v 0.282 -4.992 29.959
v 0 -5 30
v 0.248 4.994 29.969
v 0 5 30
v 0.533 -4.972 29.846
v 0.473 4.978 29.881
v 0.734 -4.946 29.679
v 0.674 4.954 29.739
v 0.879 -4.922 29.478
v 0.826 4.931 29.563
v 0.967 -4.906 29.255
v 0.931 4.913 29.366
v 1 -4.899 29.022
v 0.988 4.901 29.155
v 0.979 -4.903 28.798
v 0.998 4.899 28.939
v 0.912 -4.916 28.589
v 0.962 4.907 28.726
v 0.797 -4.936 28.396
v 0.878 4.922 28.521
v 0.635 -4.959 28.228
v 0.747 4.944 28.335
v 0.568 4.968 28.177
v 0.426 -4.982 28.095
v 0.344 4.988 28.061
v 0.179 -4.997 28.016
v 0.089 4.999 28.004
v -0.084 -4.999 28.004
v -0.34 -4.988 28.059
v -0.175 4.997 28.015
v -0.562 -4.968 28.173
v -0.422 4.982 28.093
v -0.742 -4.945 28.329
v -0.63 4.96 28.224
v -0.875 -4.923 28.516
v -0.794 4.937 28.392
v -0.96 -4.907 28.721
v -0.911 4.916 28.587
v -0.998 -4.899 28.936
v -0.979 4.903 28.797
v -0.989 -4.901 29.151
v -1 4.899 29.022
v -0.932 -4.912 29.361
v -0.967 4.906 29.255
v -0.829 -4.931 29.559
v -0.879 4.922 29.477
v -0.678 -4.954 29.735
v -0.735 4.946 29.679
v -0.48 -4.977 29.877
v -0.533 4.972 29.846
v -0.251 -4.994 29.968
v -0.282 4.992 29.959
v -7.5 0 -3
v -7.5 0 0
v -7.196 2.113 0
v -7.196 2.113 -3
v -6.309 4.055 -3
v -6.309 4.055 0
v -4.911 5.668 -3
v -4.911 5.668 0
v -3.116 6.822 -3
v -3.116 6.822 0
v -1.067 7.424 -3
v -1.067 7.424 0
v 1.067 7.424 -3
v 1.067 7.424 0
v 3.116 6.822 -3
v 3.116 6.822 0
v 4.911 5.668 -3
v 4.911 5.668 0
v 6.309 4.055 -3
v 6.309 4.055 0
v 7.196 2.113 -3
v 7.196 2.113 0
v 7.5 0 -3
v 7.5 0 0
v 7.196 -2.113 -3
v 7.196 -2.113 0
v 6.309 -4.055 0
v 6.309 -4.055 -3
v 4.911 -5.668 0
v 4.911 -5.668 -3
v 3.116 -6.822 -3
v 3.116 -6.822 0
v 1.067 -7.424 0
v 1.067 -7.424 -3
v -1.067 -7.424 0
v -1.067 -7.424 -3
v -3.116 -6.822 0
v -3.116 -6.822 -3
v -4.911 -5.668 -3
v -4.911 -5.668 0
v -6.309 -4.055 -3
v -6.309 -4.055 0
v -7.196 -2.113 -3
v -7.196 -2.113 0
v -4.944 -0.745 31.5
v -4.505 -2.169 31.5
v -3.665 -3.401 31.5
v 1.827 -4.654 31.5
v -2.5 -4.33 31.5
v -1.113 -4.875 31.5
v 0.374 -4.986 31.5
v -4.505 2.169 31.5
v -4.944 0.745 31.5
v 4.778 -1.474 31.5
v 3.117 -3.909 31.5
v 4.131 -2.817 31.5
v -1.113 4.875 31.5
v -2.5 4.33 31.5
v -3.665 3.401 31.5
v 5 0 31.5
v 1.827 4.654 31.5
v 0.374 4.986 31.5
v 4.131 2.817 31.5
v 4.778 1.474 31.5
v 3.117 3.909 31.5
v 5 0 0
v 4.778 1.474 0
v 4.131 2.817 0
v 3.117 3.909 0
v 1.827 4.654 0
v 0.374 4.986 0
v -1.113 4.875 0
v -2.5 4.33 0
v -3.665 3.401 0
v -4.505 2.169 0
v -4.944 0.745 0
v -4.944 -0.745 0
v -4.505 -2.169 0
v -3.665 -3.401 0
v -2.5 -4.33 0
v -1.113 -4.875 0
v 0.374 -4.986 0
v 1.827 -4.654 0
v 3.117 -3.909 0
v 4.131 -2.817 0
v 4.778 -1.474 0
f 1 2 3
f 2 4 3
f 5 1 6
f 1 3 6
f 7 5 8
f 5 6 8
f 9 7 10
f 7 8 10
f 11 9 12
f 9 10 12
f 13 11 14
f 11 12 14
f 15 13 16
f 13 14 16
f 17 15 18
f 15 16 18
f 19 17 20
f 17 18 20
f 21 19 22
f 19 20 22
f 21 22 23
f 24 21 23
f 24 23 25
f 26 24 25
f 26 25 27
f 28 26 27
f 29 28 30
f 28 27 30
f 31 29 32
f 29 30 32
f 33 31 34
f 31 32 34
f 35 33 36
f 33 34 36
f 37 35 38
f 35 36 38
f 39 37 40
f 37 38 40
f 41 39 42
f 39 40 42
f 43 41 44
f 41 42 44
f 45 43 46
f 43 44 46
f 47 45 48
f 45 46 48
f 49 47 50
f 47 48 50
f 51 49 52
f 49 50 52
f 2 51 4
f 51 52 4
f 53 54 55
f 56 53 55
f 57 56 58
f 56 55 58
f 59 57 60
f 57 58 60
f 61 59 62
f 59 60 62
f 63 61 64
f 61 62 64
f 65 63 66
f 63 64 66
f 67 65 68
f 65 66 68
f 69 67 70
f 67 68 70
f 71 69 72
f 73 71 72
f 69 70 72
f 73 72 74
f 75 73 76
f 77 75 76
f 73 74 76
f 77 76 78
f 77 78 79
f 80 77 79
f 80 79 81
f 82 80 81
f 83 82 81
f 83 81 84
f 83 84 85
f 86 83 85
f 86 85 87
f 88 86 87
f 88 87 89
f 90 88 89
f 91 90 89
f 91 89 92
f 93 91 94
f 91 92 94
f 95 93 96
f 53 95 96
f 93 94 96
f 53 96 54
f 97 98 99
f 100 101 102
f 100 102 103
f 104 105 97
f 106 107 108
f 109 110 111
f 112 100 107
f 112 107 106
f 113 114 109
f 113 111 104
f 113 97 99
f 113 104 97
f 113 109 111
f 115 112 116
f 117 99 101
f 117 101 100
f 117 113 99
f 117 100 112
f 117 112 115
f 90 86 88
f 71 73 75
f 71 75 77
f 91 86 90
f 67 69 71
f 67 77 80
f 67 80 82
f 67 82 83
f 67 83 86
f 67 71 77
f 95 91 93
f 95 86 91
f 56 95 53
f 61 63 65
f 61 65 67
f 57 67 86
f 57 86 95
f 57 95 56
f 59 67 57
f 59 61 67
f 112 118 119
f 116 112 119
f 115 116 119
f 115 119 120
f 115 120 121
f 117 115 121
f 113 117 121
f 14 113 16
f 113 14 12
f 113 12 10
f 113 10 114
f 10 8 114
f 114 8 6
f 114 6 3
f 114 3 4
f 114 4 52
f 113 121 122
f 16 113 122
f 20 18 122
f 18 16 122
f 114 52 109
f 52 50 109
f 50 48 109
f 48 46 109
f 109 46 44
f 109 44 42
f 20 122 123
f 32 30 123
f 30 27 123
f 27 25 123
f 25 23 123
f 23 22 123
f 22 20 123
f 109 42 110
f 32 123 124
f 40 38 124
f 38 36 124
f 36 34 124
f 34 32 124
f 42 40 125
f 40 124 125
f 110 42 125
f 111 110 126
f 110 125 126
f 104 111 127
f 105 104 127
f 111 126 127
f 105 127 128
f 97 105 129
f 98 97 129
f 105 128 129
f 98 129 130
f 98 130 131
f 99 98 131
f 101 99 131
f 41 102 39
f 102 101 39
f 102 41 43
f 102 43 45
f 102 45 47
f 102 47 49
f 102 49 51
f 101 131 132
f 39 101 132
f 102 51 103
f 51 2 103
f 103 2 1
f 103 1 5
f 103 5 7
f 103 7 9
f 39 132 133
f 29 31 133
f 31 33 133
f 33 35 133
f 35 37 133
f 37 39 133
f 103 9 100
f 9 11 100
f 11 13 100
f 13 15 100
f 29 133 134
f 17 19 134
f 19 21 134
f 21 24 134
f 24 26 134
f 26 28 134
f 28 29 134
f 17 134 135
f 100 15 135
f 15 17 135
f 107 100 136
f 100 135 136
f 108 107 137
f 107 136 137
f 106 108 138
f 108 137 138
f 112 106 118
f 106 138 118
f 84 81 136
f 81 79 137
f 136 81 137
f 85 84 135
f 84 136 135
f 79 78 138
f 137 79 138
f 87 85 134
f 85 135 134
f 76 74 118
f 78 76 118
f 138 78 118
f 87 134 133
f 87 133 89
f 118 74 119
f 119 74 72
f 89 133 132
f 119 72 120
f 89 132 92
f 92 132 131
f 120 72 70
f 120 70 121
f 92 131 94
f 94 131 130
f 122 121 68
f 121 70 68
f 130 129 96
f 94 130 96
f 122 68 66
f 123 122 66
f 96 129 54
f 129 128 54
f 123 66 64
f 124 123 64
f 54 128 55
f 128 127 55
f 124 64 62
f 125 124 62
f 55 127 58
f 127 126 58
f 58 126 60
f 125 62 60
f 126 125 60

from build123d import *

# Parameters (mm, degrees)
SKETCH1_R           = 5
BOSS_EXTRUDE1_DEPTH = 31.5
SKETCH2_R           = 1
CUT_EXTRUDE1_DEPTH  = 5
SKETCH3_R           = 7.5
BOSS_EXTRUDE2_DEPTH = 3


with BuildPart() as part:
    # Sketch1 → Boss-Extrude1 (new body)
    with BuildSketch(Plane.XY):
        Circle(SKETCH1_R)
    extrude(amount=BOSS_EXTRUDE1_DEPTH)

    # Sketch2 → Cut-Extrude1 (cut, symmetric)
    with BuildSketch(Plane(origin=(0, 0, 0), x_dir=(1, 0, 0), z_dir=(0, 1, 0))):
        with Locations(Location((0, -29, 0), (0, 0, 270))):
            Circle(SKETCH2_R)
    extrude(amount=CUT_EXTRUDE1_DEPTH, both=True, mode=Mode.SUBTRACT)

    # Sketch3 → Boss-Extrude2 (add)
    with BuildSketch(Plane(origin=(0, 0, 0), x_dir=(-1, 0, 0), z_dir=(0, 0, -1))):
        Circle(SKETCH3_R)
    extrude(amount=BOSS_EXTRUDE2_DEPTH)


solid = part.part
